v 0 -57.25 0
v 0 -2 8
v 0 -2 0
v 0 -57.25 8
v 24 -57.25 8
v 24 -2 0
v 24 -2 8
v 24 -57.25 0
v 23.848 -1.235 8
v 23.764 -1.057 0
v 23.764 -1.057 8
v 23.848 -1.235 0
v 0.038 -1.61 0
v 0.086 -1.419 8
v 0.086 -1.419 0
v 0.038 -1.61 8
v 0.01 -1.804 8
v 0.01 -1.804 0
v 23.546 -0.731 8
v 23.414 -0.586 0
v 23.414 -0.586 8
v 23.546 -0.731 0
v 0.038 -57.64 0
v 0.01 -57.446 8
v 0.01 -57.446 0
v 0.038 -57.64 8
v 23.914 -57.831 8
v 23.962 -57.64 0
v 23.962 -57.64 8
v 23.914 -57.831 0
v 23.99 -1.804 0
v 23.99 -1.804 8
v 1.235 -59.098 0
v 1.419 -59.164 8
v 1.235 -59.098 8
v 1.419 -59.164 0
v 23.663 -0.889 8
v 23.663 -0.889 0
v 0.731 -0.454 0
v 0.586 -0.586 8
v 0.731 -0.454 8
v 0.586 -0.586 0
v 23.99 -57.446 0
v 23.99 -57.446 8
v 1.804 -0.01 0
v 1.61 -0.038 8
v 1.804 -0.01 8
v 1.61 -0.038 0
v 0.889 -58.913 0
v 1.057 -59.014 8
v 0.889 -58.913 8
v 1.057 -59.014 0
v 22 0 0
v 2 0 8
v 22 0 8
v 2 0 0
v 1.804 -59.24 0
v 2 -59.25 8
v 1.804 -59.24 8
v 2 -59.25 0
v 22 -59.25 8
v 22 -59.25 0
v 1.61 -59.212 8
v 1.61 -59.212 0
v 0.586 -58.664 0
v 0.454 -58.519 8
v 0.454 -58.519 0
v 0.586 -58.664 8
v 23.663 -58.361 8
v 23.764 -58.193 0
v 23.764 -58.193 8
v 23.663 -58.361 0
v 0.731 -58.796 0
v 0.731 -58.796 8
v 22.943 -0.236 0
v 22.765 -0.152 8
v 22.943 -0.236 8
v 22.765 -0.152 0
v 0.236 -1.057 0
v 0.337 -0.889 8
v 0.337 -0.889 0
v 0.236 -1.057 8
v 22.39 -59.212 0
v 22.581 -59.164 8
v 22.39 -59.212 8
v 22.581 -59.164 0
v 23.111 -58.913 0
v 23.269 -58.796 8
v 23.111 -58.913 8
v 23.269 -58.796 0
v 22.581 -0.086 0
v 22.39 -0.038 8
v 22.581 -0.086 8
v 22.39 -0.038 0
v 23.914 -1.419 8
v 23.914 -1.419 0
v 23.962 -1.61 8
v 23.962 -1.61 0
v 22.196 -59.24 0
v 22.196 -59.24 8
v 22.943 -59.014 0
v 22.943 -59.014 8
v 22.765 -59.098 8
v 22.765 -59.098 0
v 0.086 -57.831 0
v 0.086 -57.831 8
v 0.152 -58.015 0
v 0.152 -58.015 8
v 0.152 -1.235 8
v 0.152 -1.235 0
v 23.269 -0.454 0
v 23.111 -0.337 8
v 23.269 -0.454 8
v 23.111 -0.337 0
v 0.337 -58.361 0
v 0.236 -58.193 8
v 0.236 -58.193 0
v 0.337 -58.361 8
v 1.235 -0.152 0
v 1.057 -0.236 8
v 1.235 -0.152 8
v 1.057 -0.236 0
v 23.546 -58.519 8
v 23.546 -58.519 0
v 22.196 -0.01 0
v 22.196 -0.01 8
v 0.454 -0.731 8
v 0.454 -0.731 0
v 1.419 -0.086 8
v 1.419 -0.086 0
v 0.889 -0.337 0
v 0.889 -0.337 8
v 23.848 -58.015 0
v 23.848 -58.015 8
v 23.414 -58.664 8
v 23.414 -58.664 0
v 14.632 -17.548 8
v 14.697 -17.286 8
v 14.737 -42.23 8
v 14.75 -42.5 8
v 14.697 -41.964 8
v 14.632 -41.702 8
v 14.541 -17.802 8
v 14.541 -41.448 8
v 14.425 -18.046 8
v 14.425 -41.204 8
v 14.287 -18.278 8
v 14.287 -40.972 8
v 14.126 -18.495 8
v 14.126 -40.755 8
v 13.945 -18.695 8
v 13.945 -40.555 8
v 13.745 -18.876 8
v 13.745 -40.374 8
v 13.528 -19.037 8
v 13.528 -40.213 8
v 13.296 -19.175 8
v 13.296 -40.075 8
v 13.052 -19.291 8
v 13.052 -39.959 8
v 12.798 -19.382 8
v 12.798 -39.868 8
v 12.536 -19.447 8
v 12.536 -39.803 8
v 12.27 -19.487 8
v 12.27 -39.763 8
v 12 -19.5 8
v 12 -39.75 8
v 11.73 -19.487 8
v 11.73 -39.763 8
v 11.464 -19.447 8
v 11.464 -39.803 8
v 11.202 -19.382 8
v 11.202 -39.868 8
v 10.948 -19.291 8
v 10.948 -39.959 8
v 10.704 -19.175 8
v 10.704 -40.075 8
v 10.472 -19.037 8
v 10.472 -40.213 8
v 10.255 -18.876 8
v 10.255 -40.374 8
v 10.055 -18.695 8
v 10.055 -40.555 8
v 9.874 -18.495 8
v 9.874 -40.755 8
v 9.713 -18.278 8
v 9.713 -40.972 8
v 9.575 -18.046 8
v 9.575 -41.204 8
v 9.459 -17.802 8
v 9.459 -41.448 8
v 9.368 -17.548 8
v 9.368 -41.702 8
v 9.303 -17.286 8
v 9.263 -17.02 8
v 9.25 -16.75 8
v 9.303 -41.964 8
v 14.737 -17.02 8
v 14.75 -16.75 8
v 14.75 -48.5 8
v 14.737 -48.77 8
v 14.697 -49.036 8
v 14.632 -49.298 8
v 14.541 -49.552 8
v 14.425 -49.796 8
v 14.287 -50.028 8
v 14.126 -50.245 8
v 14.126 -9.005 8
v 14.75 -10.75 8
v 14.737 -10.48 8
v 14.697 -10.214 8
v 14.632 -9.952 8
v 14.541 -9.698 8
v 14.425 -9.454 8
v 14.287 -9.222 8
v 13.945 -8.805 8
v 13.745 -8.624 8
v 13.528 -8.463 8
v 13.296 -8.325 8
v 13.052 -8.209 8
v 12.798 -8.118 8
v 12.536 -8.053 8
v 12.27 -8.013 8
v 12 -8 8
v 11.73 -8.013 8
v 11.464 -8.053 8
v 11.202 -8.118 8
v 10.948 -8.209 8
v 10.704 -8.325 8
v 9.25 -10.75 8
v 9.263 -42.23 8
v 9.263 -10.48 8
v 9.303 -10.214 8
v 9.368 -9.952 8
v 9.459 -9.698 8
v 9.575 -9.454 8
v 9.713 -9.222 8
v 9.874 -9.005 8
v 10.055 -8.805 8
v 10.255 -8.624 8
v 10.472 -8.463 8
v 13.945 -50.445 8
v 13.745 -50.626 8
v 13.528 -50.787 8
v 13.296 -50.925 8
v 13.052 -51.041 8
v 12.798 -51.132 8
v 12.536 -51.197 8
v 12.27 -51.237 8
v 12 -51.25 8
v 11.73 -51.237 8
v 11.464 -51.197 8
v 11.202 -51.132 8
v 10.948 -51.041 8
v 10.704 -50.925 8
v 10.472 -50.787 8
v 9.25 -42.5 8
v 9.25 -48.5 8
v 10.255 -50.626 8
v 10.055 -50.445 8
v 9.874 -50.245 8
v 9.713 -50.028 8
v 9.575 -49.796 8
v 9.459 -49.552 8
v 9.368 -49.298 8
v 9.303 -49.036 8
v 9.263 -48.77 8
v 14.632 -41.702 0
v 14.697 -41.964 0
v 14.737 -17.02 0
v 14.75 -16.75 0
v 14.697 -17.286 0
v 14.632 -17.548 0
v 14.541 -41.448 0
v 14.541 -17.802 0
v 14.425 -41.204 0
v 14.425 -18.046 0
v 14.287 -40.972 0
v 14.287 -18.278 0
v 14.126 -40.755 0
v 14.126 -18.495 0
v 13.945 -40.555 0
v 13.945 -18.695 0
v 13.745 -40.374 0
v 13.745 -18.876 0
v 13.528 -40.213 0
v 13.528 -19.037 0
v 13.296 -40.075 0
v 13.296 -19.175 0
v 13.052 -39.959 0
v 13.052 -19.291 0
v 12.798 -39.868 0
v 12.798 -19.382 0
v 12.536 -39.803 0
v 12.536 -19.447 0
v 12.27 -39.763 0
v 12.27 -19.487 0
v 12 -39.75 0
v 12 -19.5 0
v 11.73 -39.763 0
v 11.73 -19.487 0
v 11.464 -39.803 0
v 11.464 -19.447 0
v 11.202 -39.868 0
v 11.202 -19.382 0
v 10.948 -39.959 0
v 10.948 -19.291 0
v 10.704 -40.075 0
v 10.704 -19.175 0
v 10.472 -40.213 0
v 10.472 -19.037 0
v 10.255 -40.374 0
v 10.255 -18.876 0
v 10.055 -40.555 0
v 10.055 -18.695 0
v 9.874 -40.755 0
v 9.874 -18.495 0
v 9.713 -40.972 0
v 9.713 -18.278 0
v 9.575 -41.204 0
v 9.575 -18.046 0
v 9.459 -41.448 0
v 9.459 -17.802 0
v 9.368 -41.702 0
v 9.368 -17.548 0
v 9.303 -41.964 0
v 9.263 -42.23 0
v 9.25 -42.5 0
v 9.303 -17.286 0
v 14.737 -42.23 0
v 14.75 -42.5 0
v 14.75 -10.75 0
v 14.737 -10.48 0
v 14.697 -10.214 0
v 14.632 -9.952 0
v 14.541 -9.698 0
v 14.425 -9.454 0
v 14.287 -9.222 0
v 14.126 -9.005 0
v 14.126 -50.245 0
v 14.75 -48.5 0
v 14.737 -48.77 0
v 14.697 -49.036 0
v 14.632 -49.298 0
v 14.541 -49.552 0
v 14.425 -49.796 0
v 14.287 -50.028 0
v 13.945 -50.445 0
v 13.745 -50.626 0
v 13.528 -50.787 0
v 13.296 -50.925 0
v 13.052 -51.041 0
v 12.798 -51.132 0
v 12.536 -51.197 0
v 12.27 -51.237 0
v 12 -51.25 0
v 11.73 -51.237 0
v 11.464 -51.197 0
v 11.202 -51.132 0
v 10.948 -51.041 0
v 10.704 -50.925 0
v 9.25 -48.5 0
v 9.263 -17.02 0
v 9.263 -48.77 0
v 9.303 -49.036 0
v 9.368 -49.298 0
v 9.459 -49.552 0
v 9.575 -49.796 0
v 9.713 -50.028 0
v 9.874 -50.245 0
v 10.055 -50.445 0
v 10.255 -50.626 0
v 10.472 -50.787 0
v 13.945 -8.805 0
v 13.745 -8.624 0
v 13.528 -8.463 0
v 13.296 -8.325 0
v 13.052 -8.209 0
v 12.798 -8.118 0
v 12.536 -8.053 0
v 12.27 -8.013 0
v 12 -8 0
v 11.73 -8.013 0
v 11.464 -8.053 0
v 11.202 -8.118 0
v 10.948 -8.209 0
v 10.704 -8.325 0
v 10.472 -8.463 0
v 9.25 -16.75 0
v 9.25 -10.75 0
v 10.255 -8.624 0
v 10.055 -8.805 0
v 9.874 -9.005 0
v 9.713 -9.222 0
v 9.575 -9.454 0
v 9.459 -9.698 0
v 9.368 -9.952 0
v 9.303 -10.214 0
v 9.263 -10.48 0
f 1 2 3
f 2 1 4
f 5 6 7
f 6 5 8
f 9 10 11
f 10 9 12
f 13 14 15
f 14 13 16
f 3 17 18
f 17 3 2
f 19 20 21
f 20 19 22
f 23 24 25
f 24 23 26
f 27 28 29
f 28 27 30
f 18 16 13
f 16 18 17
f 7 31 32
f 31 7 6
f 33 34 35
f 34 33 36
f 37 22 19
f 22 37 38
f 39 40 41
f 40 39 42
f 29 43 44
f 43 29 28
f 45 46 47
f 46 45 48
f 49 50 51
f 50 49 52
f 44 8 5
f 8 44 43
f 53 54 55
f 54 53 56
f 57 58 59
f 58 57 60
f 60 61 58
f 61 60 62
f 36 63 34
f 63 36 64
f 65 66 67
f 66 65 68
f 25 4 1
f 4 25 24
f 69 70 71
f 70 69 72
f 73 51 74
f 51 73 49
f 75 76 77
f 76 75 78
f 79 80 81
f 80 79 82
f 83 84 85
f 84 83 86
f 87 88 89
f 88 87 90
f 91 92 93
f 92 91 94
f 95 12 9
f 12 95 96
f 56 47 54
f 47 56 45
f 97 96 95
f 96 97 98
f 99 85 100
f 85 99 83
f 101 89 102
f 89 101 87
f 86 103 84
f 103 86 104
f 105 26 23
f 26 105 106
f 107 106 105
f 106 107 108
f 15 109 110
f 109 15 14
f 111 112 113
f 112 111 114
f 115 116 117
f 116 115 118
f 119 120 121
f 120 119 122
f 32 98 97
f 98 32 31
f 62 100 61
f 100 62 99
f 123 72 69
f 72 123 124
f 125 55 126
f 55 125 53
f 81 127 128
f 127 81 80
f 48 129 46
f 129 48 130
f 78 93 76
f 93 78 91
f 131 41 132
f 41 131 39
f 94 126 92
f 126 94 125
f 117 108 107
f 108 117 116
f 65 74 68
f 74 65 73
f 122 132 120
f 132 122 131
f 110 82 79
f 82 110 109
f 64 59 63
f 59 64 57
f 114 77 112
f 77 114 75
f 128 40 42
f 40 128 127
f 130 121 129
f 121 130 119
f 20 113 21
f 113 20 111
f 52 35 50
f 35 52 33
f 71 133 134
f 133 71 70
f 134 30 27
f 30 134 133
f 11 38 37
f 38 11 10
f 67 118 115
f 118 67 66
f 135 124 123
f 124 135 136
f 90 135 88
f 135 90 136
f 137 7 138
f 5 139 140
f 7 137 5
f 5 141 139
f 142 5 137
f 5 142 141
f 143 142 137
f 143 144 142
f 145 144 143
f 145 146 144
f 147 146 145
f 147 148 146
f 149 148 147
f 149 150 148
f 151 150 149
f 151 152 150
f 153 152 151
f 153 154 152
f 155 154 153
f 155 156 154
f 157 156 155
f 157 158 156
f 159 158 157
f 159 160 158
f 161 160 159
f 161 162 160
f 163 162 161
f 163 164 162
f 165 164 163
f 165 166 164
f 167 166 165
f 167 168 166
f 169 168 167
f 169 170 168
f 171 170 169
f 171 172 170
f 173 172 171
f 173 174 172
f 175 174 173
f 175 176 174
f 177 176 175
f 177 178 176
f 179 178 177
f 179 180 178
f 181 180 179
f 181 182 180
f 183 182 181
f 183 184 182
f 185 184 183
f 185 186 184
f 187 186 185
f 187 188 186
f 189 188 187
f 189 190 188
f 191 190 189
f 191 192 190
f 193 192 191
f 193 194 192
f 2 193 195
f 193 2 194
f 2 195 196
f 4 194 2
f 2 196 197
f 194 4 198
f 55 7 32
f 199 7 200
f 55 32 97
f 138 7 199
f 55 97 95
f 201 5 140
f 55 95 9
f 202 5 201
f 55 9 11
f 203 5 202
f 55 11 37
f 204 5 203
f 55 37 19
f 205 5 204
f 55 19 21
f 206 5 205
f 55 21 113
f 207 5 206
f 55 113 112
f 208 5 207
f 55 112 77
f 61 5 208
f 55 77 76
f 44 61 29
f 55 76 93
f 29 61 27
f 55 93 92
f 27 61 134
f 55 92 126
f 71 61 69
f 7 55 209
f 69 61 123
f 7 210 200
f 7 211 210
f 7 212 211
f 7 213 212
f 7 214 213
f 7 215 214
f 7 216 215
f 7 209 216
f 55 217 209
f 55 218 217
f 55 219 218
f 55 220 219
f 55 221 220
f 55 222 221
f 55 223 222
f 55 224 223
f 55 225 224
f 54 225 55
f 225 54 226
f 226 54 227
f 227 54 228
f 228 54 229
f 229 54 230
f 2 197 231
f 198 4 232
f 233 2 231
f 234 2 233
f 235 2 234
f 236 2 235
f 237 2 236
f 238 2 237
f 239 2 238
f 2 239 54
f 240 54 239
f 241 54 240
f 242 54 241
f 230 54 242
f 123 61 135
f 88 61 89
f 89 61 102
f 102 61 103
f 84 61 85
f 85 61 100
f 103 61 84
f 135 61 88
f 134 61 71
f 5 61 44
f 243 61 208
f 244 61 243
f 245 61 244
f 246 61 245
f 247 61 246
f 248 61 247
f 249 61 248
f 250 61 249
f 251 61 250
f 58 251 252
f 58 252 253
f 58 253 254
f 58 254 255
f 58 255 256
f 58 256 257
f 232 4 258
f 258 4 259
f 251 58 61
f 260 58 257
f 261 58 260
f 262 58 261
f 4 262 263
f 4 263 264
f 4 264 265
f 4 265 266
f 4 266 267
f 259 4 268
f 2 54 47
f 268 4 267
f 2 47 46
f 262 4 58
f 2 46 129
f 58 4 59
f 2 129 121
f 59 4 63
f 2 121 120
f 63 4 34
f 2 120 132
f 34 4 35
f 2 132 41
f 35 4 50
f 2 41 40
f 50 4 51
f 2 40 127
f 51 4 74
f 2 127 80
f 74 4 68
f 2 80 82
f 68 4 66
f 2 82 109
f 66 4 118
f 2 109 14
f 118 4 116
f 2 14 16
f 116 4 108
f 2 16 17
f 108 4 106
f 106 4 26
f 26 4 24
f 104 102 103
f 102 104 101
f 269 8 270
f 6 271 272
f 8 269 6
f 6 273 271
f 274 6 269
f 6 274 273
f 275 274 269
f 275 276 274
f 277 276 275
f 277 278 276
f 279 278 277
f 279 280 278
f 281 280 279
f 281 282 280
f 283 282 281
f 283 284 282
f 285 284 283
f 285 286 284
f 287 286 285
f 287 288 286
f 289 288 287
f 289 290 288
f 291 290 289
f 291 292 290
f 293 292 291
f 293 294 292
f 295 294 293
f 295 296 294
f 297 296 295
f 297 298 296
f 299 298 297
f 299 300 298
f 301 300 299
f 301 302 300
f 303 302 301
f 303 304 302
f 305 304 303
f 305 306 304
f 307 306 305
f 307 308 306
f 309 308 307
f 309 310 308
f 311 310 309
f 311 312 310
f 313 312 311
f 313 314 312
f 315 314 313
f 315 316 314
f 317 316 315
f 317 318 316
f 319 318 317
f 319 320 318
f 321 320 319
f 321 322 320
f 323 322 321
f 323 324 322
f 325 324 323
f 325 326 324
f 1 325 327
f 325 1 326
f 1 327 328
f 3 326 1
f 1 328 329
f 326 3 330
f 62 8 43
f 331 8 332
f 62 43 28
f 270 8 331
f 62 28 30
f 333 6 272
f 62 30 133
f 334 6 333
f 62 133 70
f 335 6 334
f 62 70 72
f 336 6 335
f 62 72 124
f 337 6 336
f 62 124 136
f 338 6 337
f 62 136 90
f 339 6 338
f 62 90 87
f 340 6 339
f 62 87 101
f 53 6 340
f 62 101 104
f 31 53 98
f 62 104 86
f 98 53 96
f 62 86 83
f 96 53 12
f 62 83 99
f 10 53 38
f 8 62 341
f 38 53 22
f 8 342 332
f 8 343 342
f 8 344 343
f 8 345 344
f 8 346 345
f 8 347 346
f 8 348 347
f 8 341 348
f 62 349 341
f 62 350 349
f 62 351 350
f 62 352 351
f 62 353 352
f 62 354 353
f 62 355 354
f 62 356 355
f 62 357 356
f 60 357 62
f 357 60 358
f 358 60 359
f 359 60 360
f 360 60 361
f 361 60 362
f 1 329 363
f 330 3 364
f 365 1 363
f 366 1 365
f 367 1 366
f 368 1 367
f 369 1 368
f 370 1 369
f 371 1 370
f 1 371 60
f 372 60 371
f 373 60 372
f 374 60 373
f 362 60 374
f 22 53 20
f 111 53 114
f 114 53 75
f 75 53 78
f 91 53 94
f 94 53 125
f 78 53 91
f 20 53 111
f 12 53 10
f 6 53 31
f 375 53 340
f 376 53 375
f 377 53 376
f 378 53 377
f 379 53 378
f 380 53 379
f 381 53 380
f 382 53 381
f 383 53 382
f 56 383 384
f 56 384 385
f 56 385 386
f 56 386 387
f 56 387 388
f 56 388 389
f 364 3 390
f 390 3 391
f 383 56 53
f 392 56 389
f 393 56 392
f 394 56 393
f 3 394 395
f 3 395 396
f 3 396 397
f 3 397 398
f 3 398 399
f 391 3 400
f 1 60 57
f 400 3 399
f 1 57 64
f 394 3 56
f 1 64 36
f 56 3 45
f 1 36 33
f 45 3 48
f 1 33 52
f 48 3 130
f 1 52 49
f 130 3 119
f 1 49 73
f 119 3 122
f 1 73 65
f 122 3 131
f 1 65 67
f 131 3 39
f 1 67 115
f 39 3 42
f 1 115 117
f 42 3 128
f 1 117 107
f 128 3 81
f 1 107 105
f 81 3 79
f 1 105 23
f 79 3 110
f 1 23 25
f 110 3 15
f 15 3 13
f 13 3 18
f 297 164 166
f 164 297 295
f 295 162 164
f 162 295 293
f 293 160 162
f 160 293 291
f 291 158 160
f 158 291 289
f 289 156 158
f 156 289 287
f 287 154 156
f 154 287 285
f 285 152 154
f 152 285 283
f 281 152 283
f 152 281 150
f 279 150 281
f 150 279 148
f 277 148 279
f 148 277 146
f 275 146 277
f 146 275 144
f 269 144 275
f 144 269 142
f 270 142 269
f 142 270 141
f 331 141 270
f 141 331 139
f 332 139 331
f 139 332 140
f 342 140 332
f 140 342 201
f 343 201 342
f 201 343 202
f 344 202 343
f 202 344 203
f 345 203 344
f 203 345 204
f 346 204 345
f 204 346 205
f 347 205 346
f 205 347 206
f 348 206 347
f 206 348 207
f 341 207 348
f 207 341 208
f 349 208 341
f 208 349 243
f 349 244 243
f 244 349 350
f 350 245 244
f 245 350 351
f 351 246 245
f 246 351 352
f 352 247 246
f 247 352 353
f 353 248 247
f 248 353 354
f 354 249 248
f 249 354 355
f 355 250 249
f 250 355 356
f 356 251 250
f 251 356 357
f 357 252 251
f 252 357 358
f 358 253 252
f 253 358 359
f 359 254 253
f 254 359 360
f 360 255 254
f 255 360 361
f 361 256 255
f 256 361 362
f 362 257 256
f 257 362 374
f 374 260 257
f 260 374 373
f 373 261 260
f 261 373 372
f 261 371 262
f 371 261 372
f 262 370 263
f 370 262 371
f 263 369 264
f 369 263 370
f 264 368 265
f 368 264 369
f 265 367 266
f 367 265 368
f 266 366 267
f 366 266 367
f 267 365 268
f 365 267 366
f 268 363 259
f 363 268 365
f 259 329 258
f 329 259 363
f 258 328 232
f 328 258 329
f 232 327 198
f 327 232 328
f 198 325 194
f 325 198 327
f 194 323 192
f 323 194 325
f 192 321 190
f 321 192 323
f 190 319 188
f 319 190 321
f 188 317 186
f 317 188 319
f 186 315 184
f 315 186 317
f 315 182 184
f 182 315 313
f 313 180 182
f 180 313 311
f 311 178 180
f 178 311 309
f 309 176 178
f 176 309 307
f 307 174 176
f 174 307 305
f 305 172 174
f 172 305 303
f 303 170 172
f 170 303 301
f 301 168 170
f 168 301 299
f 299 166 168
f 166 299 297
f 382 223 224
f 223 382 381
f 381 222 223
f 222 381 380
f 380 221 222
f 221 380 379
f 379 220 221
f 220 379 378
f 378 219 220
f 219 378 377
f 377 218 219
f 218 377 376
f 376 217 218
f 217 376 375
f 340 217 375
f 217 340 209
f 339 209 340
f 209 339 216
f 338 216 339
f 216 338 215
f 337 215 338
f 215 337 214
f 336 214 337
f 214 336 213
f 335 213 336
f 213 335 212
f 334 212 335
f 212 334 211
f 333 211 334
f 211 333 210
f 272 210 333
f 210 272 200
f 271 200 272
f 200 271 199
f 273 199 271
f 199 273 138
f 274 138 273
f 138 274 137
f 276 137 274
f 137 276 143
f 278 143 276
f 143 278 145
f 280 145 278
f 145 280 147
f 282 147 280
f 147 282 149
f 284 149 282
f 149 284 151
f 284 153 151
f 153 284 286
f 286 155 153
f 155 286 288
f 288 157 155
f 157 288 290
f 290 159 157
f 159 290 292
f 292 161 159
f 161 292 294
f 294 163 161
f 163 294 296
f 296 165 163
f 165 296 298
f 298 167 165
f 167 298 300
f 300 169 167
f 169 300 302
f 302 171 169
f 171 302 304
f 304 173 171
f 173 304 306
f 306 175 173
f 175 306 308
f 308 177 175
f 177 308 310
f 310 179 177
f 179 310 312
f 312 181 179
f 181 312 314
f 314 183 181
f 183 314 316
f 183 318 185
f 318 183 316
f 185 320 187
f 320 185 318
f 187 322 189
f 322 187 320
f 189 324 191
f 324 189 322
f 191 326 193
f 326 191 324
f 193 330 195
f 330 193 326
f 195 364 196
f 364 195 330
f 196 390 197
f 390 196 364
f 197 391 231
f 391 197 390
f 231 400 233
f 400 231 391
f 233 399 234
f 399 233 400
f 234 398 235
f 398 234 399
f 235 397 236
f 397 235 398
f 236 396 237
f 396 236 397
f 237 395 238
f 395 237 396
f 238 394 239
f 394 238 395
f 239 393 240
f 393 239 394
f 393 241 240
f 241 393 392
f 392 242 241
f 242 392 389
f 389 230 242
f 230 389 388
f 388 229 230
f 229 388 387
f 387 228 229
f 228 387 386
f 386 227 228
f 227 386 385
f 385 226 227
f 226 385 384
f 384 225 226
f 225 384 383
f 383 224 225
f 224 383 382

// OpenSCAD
// file: rack-service-loop-saddle.scad
// Open J saddle for one measured rack post. Units: mm.
// Defaults are prototype examples, not a verified 10-inch rack interface.

/* [Output] */
part = "saddle"; // [saddle,mounting_coupon]
side = "right"; // [right,left]
print_orientation = true;

/* [Mounting: measure rail and hardware] */
mount_spacing = 31.75; // example only; no universal mini-rack pattern assumed
screw_diameter = 5.5; // clearance opening, not a thread specification
slot_travel = 6; // total extra vertical adjustment
tab_width = 24;
tab_thickness = 8;
mount_edge = 8; // solid material beyond each slot end

/* [Cable support: measure bundle and bend requirement] */
support_radius = 24; // inner contact radius; verify actual cable requirements
wall_thickness = 10;
saddle_width = 22; // contact depth, normal to the mounting face
projection = 68; // from tab's outer edge to the saddle's farthest point
edge_round = 1; // rounded cable-contact edges

/* [Loose hook-and-loop strap] */
strap_width = 12;
strap_clearance = 1;
strap_gap = 2.6;

/* [Hidden] */
$fn = 64;
epsilon = 0.05;
overlap = 3;
tab_corner_radius = 2;
root_top_margin = 3;
rounding_fragments = 16;
min_strap_wall = 1.5;
min_mount_material = 3;
min_support_radius = 8;
min_support_wall = 4;
max_projection_factor = 3;
outer_radius = support_radius + wall_thickness;
tab_height = mount_spacing + screw_diameter + slot_travel + 2 * mount_edge;
center_x = tab_width + projection - outer_radius;
center_z = outer_radius;
left_stem_x = center_x - support_radius - wall_thickness / 2;
root_top = min(tab_height - root_top_margin, center_z + support_radius);
slot_length = screw_diameter + slot_travel;
strap_opening = strap_width + strap_clearance;
// An inscribed circle bounds the faceted arc after erosion at its face.
face_outer_radius = outer_radius * cos(180 / $fn) - edge_round;
strap_bottom_rise = outer_radius - sqrt(face_outer_radius * face_outer_radius -
                                       strap_opening * strap_opening / 4);

assert(part == "saddle" || part == "mounting_coupon", "Unknown part selector");
assert(side == "right" || side == "left", "side must be right or left");
assert(mount_spacing > slot_length, "mount_spacing must separate the slots");
assert(screw_diameter > 0 && slot_travel >= 0 && mount_edge >= min_mount_material,
       "Mounting dimensions need positive holes and material around slots");
assert(tab_width >= screw_diameter + 2 * mount_edge && tab_thickness >= min_mount_material,
       "Mounting tab is too small for the slots");
assert(support_radius >= min_support_radius && wall_thickness >= min_support_wall,
       "Support radius or wall thickness is too small");
assert(edge_round > 0 && 2 * edge_round < wall_thickness &&
       saddle_width > 2 * edge_round && saddle_width >= tab_thickness,
       "edge_round and saddle_width must leave a solid support");
assert(projection >= 2 * outer_radius - overlap &&
       projection <= max_projection_factor * outer_radius,
       "projection must retain root overlap without a long unsupported neck");
assert(root_top > center_z + wall_thickness,
       "Mounting tab must extend above the saddle root");
assert(strap_width > 0 && strap_clearance >= 0 && strap_gap > 0 &&
       strap_gap <= wall_thickness - 2 * min_strap_wall && strap_gap < strap_width + strap_clearance,
       "Strap opening must leave at least 1.5 mm above and below");
assert(strap_width + strap_clearance <= support_radius,
       "Strap opening is too wide for the curved base");
// Account for both the curved underside and eroded profile at rounded faces.
assert(wall_thickness / 2 - strap_gap / 2 - strap_bottom_rise - epsilon >= min_strap_wall,
       "Strap opening leaves too little material at the rounded curved base");

// Profiles are drawn in X/Z, then extruded along Y.
module depth_extrude(depth) {
    translate([0, depth, 0]) rotate([90, 0, 0])
        linear_extrude(height = depth) children();
}

module rounded_rectangle(width, height, radius) {
    hull() for (x = [radius, width - radius], z = [radius, height - radius])
        translate([x, z]) circle(r = radius);
}

module vertical_slot(diameter, travel) {
    hull() for (z = [-travel / 2, travel / 2])
        translate([0, z]) circle(d = diameter);
}

module mounting_profile() {
    rounded_rectangle(tab_width, tab_height, tab_corner_radius);
}

module saddle_profile() {
    union() {
        // Lower half of an annulus: broad inner contact and an open top.
        intersection() {
            translate([center_x, center_z]) difference() {
                circle(r = outer_radius);
                circle(r = support_radius);
            }
            translate([center_x - outer_radius, 0])
                square([2 * outer_radius, center_z]);
        }
        // Rounded tip and a neck that overlaps the mounting tab.
        translate([center_x + support_radius + wall_thickness / 2, center_z])
            circle(d = wall_thickness);
        hull() {
            translate([left_stem_x, center_z]) circle(d = wall_thickness);
            translate([left_stem_x, root_top]) circle(d = wall_thickness);
            translate([tab_width - overlap, root_top]) circle(d = wall_thickness);
        }
    }
}

module saddle_body() {
    // Erode before rounding, so radius/projection/depth keep their meaning.
    // A small sphere rounds both profile edges and the two contact faces.
    minkowski() {
        translate([0, edge_round, 0]) depth_extrude(saddle_width - 2 * edge_round)
            offset(delta = -edge_round) saddle_profile();
        sphere(r = edge_round, $fn = rounding_fragments);
    }
}

module rack_saddle() {
    difference() {
        union() {
            depth_extrude(tab_thickness) mounting_profile();
            if (part == "saddle") saddle_body();
        }
        translate([0, -epsilon, 0]) depth_extrude(saddle_width + 2 * epsilon) {
            for (z = [tab_height / 2 - mount_spacing / 2,
                      tab_height / 2 + mount_spacing / 2])
                translate([tab_width / 2, z]) vertical_slot(screw_diameter, slot_travel);
            if (part == "saddle")
                translate([center_x - strap_opening / 2,
                           wall_thickness / 2 - strap_gap / 2])
                    rounded_rectangle(strap_opening, strap_gap, strap_gap / 2);
        }
    }
}

module sided_part() {
    if (side == "left") mirror([1, 0, 0]) rack_saddle();
    else rack_saddle();
}

// Print on the broad side: Y=0 becomes the bed plane, without supports
// under the arc. Installed orientation has the tab upright and opening up.
if (print_orientation) rotate([90, 0, 0]) sided_part();
else sided_part();
// main file
// Uses exactly the saddle's mounting tab, slots and parameter assertions.
include <rack-service-loop-saddle.scad>
part = "mounting_coupon";
